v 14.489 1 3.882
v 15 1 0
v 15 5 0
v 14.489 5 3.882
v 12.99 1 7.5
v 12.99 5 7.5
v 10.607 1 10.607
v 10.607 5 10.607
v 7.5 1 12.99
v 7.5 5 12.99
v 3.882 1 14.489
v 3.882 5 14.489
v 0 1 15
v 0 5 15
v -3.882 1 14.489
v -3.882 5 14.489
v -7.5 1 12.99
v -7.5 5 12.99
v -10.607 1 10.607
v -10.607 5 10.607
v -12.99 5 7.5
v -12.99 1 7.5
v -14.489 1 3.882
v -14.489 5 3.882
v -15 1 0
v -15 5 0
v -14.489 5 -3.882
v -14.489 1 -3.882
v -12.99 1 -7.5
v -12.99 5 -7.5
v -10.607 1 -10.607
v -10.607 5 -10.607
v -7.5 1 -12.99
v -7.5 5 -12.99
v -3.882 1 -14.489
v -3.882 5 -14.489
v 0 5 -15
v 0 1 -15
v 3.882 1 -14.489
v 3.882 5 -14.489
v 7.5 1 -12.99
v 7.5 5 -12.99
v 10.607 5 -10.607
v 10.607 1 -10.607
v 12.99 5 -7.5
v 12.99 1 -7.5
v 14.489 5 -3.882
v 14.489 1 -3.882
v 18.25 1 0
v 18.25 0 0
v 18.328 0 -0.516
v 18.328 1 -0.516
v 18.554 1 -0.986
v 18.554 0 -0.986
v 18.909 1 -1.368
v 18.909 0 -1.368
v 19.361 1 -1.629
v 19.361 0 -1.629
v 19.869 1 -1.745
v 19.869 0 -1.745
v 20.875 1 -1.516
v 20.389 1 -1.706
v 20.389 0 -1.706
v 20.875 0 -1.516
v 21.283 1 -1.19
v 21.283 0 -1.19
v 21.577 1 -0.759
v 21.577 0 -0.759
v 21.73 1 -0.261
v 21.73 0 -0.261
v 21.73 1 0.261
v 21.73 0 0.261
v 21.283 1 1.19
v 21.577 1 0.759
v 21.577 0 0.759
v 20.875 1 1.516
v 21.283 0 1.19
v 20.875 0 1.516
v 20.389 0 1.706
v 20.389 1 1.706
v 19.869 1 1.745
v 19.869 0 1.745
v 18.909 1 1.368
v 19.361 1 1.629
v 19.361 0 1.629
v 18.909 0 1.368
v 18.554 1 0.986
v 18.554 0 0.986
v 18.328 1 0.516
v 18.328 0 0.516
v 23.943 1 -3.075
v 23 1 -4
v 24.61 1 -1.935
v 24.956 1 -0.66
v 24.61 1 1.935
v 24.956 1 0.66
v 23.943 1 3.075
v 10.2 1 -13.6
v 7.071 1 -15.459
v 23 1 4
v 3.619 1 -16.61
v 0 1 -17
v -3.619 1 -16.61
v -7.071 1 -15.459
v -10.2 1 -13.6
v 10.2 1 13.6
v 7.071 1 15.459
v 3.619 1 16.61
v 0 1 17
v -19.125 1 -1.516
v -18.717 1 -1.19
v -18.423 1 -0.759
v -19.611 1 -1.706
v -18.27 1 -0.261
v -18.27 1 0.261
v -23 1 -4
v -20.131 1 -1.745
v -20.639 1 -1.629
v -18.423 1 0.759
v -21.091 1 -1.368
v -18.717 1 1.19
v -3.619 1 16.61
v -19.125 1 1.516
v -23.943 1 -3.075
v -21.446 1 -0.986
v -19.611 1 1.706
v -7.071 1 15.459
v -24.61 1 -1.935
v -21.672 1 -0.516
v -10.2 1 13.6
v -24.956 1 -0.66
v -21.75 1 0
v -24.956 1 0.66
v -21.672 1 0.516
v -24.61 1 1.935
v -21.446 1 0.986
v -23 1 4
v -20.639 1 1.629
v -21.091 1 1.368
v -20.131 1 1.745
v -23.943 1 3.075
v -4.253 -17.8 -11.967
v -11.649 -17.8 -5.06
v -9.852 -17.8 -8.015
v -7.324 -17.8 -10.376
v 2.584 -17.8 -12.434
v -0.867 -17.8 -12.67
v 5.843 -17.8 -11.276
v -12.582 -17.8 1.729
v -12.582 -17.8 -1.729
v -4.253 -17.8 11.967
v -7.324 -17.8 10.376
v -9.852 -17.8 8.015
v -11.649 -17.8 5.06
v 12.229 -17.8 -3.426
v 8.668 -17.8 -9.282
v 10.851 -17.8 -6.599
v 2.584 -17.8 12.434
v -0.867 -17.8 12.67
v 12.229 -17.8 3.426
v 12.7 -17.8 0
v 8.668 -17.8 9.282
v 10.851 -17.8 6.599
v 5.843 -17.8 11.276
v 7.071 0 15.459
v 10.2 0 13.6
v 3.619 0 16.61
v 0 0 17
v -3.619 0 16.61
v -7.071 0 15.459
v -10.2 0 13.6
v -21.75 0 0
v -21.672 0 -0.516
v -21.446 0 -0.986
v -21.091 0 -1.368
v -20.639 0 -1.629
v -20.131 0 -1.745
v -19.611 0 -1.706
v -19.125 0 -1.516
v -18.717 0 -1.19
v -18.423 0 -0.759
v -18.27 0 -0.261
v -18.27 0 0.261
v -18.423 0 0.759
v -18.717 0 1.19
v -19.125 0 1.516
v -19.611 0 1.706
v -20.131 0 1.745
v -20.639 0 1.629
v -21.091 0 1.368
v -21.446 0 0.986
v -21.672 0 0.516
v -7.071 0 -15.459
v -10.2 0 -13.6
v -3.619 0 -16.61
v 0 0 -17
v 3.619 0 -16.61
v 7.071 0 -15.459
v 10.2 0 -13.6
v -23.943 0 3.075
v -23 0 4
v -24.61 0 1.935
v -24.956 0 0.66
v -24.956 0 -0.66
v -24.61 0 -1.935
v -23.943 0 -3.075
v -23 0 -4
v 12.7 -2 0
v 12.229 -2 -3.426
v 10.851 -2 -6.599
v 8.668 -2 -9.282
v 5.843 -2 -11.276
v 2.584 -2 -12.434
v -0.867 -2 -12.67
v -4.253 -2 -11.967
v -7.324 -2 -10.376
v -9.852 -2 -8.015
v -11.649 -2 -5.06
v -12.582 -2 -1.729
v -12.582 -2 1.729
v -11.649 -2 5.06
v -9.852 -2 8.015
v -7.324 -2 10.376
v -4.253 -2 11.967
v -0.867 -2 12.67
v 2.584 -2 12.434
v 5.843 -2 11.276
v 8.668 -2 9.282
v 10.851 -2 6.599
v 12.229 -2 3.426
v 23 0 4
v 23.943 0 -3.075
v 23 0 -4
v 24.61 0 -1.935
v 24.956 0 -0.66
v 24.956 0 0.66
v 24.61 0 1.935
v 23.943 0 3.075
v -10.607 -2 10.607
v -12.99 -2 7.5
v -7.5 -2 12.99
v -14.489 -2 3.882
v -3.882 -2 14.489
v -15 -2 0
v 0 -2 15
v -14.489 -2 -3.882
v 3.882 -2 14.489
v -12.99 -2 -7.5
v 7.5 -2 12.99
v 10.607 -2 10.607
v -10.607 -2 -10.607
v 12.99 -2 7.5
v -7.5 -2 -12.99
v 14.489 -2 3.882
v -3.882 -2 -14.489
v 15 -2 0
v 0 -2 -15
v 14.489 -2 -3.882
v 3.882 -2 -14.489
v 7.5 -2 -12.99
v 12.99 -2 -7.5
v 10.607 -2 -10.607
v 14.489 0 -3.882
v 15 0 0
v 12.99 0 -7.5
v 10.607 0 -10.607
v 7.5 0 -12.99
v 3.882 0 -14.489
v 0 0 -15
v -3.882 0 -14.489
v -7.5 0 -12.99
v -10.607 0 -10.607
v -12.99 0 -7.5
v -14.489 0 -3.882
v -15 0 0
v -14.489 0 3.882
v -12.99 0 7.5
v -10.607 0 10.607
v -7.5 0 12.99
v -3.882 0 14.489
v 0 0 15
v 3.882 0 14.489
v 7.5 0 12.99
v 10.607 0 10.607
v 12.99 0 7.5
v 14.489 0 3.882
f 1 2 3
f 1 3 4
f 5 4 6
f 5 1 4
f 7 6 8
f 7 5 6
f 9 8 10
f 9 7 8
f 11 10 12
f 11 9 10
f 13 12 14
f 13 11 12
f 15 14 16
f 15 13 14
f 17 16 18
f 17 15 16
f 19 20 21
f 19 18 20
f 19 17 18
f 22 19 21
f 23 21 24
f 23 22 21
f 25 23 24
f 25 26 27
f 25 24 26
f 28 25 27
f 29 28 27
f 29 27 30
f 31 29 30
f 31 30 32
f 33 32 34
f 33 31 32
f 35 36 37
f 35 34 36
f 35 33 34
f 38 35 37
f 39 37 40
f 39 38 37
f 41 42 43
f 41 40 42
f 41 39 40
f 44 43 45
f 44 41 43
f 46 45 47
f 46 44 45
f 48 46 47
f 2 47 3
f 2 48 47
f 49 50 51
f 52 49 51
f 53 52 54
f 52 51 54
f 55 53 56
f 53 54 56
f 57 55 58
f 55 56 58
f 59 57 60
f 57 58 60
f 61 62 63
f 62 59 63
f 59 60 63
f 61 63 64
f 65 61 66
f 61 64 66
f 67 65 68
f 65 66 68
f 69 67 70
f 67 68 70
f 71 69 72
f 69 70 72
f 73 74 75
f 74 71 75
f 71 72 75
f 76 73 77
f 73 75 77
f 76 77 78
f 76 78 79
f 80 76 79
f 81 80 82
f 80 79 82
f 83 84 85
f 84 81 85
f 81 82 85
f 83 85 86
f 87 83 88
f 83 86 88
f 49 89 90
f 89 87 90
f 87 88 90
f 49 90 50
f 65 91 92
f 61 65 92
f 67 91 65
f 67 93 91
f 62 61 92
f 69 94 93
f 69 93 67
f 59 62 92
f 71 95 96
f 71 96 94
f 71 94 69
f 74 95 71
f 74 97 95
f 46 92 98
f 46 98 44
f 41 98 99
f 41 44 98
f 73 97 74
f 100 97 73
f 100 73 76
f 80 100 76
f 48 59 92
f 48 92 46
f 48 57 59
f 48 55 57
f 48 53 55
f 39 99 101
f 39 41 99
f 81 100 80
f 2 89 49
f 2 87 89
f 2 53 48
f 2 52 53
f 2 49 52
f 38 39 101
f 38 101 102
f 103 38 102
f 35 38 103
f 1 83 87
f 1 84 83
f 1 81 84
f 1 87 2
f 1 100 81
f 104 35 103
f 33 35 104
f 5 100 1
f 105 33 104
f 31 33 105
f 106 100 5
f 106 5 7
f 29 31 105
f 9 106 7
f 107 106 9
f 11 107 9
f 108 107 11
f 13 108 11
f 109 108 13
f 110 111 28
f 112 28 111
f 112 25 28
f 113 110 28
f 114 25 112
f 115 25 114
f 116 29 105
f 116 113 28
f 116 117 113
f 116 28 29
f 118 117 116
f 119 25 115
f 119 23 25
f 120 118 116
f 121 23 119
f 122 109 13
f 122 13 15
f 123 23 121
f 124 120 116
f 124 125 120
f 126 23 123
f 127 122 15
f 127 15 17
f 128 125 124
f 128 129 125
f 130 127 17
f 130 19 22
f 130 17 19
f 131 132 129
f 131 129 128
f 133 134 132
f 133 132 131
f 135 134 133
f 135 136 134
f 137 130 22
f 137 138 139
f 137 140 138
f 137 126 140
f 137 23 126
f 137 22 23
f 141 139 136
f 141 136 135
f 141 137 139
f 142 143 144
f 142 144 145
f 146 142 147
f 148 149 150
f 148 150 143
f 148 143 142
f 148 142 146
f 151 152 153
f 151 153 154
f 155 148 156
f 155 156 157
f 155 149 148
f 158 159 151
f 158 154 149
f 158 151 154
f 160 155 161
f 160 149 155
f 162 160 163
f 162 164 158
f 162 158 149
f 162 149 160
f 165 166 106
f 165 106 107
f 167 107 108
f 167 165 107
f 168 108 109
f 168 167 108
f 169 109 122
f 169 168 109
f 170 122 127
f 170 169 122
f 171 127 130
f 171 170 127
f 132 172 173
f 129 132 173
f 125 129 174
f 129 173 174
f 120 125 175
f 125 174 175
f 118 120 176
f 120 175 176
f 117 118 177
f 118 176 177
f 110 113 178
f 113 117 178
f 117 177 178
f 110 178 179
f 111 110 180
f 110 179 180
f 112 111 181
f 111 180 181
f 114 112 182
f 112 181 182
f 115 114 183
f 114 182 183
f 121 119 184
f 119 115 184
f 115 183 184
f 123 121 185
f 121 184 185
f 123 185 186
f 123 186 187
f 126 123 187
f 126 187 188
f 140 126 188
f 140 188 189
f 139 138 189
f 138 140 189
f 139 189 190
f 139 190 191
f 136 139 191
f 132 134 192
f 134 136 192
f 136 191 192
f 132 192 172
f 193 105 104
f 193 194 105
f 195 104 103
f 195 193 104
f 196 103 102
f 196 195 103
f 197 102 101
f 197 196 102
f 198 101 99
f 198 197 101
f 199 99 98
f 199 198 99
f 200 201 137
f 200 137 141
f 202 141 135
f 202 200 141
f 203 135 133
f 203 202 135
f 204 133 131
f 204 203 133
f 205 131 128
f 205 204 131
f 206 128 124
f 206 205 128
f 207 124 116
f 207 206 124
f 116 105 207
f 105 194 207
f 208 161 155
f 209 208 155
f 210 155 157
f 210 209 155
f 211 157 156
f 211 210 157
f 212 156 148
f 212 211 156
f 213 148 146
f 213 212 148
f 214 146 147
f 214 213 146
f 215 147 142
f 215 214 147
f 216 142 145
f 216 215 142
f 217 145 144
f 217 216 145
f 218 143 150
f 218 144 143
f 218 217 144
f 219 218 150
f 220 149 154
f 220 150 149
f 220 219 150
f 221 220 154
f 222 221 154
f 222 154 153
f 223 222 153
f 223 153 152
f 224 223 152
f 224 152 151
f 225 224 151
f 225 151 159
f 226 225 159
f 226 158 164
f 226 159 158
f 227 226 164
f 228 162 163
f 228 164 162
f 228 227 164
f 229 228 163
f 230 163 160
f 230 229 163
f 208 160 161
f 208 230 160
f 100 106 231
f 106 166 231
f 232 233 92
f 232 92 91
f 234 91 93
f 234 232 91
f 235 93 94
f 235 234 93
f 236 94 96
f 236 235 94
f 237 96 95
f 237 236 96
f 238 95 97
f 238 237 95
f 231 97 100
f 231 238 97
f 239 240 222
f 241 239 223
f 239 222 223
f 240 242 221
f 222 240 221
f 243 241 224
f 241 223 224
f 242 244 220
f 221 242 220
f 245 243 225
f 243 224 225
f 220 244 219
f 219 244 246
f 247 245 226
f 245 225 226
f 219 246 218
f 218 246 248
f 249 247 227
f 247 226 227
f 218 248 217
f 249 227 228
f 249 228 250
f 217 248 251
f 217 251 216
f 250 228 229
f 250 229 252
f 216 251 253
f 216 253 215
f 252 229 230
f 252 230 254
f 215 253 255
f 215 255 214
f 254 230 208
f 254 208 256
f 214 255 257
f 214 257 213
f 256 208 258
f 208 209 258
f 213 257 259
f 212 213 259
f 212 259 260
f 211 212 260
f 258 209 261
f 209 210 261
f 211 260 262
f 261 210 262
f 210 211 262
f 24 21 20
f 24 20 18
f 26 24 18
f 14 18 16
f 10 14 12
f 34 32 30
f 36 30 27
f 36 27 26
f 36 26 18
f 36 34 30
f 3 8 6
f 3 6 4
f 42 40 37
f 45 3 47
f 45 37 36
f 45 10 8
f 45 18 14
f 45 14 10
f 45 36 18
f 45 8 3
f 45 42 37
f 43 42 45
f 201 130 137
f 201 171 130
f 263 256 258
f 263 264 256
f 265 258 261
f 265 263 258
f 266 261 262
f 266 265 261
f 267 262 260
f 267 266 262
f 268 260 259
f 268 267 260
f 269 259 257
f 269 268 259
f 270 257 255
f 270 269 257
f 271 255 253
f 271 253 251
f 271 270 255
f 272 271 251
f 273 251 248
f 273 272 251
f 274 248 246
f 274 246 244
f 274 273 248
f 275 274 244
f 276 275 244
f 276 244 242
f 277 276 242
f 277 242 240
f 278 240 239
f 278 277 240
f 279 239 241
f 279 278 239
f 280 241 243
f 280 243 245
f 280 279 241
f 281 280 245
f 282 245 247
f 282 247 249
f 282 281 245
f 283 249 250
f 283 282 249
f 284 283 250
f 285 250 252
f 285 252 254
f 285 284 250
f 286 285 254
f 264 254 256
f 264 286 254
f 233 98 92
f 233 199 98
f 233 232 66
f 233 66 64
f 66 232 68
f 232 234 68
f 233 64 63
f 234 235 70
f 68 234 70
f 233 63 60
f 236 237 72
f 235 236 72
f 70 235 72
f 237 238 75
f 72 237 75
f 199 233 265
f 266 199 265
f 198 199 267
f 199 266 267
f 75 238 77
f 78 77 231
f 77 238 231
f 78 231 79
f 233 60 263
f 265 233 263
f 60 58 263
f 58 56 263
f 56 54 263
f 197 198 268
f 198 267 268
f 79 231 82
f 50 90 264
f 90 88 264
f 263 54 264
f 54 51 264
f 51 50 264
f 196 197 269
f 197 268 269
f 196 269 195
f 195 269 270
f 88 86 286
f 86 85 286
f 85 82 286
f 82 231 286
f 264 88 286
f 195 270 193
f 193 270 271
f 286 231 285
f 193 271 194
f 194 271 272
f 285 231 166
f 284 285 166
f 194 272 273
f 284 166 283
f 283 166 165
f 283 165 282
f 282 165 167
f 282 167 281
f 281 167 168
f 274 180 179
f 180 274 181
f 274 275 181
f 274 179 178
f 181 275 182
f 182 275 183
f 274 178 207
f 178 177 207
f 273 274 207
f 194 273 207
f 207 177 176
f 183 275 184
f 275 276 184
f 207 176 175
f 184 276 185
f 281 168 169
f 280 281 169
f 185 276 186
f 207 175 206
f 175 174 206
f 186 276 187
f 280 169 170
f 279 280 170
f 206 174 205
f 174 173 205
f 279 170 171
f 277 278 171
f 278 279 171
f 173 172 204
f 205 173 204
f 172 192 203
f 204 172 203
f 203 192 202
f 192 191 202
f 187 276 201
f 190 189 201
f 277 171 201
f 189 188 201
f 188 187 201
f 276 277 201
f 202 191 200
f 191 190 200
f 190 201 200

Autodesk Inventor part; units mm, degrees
ref_plane "YZ Plane" through (0, 0, 0) normal (1, 0, 0) x (0, 1, 0)
ref_plane "XZ Plane" through (0, 0, 0) normal (0, 1, 0) x (-1, 0, 0)
ref_plane "XY Plane" through (0, 0, 0) normal (0, 0, 1) x (1, 0, 0)
sketch "Sketch1" plane through (0, 0, 0) normal (0, 1, 0) x (-1, 0, 0)
  line L0 (0, 0) -> (20, 0) construction
  circle A0 centre (20, 0) radius 1.75
  line L1 (0, 0) -> (25, 0) construction
  line L2 (25, 0) -> (25, -10) construction
  line L3 (10.2, 13.6) -> (23, 4)
  line L4 (10.2, -13.6) -> (23, -4)
  arc A1 (23, -4) -> (23, 4) centre (20, 0) ccw
  line L5 (0, 0) -> (0, -10)
  circle A2 centre (-20, 0) radius 1.75
  line L6 (-10.2, 13.6) -> (-23, 4)
  line L7 (-10.2, -13.6) -> (-23, -4)
  arc A3 (-23, 4) -> (-23, -4) centre (-20, 0) ccw
  arc A4 (10.2, 13.6) -> (-10.2, 13.6) centre (0, 0) ccw
  arc A5 (-10.2, -13.6) -> (10.2, -13.6) centre (0, 0) ccw
  dimension "d1" = 20
  dimension "d2" = 3.5
  dimension "d3" = 25
  dimension "d7" = 17
  dimension "d20" = 10
  dimension "d21" = 10
extrude "Extrusion1" add sketch "Sketch1" along normal blind 1
sketch "Sketch2" plane through (0, 1, 0) normal (0, 1, 0) x (1, 0, 0)
  circle A0 centre (0, 0) radius 15
  dimension "d11" = 30
extrude "Extrusion2" add sketch "Sketch2" along normal blind 4 and the other way blind 3
sketch "Sketch3" plane through (0, -2, 0) normal (0, -1, 0) x (1, 0, 0)
  circle A0 centre (0, 0) radius 12.7
  dimension "d15" = 25.4
extrude "Extrusion3" add sketch "Sketch3" along normal blind 15.8
properties part number "tube socket 9 pin"
